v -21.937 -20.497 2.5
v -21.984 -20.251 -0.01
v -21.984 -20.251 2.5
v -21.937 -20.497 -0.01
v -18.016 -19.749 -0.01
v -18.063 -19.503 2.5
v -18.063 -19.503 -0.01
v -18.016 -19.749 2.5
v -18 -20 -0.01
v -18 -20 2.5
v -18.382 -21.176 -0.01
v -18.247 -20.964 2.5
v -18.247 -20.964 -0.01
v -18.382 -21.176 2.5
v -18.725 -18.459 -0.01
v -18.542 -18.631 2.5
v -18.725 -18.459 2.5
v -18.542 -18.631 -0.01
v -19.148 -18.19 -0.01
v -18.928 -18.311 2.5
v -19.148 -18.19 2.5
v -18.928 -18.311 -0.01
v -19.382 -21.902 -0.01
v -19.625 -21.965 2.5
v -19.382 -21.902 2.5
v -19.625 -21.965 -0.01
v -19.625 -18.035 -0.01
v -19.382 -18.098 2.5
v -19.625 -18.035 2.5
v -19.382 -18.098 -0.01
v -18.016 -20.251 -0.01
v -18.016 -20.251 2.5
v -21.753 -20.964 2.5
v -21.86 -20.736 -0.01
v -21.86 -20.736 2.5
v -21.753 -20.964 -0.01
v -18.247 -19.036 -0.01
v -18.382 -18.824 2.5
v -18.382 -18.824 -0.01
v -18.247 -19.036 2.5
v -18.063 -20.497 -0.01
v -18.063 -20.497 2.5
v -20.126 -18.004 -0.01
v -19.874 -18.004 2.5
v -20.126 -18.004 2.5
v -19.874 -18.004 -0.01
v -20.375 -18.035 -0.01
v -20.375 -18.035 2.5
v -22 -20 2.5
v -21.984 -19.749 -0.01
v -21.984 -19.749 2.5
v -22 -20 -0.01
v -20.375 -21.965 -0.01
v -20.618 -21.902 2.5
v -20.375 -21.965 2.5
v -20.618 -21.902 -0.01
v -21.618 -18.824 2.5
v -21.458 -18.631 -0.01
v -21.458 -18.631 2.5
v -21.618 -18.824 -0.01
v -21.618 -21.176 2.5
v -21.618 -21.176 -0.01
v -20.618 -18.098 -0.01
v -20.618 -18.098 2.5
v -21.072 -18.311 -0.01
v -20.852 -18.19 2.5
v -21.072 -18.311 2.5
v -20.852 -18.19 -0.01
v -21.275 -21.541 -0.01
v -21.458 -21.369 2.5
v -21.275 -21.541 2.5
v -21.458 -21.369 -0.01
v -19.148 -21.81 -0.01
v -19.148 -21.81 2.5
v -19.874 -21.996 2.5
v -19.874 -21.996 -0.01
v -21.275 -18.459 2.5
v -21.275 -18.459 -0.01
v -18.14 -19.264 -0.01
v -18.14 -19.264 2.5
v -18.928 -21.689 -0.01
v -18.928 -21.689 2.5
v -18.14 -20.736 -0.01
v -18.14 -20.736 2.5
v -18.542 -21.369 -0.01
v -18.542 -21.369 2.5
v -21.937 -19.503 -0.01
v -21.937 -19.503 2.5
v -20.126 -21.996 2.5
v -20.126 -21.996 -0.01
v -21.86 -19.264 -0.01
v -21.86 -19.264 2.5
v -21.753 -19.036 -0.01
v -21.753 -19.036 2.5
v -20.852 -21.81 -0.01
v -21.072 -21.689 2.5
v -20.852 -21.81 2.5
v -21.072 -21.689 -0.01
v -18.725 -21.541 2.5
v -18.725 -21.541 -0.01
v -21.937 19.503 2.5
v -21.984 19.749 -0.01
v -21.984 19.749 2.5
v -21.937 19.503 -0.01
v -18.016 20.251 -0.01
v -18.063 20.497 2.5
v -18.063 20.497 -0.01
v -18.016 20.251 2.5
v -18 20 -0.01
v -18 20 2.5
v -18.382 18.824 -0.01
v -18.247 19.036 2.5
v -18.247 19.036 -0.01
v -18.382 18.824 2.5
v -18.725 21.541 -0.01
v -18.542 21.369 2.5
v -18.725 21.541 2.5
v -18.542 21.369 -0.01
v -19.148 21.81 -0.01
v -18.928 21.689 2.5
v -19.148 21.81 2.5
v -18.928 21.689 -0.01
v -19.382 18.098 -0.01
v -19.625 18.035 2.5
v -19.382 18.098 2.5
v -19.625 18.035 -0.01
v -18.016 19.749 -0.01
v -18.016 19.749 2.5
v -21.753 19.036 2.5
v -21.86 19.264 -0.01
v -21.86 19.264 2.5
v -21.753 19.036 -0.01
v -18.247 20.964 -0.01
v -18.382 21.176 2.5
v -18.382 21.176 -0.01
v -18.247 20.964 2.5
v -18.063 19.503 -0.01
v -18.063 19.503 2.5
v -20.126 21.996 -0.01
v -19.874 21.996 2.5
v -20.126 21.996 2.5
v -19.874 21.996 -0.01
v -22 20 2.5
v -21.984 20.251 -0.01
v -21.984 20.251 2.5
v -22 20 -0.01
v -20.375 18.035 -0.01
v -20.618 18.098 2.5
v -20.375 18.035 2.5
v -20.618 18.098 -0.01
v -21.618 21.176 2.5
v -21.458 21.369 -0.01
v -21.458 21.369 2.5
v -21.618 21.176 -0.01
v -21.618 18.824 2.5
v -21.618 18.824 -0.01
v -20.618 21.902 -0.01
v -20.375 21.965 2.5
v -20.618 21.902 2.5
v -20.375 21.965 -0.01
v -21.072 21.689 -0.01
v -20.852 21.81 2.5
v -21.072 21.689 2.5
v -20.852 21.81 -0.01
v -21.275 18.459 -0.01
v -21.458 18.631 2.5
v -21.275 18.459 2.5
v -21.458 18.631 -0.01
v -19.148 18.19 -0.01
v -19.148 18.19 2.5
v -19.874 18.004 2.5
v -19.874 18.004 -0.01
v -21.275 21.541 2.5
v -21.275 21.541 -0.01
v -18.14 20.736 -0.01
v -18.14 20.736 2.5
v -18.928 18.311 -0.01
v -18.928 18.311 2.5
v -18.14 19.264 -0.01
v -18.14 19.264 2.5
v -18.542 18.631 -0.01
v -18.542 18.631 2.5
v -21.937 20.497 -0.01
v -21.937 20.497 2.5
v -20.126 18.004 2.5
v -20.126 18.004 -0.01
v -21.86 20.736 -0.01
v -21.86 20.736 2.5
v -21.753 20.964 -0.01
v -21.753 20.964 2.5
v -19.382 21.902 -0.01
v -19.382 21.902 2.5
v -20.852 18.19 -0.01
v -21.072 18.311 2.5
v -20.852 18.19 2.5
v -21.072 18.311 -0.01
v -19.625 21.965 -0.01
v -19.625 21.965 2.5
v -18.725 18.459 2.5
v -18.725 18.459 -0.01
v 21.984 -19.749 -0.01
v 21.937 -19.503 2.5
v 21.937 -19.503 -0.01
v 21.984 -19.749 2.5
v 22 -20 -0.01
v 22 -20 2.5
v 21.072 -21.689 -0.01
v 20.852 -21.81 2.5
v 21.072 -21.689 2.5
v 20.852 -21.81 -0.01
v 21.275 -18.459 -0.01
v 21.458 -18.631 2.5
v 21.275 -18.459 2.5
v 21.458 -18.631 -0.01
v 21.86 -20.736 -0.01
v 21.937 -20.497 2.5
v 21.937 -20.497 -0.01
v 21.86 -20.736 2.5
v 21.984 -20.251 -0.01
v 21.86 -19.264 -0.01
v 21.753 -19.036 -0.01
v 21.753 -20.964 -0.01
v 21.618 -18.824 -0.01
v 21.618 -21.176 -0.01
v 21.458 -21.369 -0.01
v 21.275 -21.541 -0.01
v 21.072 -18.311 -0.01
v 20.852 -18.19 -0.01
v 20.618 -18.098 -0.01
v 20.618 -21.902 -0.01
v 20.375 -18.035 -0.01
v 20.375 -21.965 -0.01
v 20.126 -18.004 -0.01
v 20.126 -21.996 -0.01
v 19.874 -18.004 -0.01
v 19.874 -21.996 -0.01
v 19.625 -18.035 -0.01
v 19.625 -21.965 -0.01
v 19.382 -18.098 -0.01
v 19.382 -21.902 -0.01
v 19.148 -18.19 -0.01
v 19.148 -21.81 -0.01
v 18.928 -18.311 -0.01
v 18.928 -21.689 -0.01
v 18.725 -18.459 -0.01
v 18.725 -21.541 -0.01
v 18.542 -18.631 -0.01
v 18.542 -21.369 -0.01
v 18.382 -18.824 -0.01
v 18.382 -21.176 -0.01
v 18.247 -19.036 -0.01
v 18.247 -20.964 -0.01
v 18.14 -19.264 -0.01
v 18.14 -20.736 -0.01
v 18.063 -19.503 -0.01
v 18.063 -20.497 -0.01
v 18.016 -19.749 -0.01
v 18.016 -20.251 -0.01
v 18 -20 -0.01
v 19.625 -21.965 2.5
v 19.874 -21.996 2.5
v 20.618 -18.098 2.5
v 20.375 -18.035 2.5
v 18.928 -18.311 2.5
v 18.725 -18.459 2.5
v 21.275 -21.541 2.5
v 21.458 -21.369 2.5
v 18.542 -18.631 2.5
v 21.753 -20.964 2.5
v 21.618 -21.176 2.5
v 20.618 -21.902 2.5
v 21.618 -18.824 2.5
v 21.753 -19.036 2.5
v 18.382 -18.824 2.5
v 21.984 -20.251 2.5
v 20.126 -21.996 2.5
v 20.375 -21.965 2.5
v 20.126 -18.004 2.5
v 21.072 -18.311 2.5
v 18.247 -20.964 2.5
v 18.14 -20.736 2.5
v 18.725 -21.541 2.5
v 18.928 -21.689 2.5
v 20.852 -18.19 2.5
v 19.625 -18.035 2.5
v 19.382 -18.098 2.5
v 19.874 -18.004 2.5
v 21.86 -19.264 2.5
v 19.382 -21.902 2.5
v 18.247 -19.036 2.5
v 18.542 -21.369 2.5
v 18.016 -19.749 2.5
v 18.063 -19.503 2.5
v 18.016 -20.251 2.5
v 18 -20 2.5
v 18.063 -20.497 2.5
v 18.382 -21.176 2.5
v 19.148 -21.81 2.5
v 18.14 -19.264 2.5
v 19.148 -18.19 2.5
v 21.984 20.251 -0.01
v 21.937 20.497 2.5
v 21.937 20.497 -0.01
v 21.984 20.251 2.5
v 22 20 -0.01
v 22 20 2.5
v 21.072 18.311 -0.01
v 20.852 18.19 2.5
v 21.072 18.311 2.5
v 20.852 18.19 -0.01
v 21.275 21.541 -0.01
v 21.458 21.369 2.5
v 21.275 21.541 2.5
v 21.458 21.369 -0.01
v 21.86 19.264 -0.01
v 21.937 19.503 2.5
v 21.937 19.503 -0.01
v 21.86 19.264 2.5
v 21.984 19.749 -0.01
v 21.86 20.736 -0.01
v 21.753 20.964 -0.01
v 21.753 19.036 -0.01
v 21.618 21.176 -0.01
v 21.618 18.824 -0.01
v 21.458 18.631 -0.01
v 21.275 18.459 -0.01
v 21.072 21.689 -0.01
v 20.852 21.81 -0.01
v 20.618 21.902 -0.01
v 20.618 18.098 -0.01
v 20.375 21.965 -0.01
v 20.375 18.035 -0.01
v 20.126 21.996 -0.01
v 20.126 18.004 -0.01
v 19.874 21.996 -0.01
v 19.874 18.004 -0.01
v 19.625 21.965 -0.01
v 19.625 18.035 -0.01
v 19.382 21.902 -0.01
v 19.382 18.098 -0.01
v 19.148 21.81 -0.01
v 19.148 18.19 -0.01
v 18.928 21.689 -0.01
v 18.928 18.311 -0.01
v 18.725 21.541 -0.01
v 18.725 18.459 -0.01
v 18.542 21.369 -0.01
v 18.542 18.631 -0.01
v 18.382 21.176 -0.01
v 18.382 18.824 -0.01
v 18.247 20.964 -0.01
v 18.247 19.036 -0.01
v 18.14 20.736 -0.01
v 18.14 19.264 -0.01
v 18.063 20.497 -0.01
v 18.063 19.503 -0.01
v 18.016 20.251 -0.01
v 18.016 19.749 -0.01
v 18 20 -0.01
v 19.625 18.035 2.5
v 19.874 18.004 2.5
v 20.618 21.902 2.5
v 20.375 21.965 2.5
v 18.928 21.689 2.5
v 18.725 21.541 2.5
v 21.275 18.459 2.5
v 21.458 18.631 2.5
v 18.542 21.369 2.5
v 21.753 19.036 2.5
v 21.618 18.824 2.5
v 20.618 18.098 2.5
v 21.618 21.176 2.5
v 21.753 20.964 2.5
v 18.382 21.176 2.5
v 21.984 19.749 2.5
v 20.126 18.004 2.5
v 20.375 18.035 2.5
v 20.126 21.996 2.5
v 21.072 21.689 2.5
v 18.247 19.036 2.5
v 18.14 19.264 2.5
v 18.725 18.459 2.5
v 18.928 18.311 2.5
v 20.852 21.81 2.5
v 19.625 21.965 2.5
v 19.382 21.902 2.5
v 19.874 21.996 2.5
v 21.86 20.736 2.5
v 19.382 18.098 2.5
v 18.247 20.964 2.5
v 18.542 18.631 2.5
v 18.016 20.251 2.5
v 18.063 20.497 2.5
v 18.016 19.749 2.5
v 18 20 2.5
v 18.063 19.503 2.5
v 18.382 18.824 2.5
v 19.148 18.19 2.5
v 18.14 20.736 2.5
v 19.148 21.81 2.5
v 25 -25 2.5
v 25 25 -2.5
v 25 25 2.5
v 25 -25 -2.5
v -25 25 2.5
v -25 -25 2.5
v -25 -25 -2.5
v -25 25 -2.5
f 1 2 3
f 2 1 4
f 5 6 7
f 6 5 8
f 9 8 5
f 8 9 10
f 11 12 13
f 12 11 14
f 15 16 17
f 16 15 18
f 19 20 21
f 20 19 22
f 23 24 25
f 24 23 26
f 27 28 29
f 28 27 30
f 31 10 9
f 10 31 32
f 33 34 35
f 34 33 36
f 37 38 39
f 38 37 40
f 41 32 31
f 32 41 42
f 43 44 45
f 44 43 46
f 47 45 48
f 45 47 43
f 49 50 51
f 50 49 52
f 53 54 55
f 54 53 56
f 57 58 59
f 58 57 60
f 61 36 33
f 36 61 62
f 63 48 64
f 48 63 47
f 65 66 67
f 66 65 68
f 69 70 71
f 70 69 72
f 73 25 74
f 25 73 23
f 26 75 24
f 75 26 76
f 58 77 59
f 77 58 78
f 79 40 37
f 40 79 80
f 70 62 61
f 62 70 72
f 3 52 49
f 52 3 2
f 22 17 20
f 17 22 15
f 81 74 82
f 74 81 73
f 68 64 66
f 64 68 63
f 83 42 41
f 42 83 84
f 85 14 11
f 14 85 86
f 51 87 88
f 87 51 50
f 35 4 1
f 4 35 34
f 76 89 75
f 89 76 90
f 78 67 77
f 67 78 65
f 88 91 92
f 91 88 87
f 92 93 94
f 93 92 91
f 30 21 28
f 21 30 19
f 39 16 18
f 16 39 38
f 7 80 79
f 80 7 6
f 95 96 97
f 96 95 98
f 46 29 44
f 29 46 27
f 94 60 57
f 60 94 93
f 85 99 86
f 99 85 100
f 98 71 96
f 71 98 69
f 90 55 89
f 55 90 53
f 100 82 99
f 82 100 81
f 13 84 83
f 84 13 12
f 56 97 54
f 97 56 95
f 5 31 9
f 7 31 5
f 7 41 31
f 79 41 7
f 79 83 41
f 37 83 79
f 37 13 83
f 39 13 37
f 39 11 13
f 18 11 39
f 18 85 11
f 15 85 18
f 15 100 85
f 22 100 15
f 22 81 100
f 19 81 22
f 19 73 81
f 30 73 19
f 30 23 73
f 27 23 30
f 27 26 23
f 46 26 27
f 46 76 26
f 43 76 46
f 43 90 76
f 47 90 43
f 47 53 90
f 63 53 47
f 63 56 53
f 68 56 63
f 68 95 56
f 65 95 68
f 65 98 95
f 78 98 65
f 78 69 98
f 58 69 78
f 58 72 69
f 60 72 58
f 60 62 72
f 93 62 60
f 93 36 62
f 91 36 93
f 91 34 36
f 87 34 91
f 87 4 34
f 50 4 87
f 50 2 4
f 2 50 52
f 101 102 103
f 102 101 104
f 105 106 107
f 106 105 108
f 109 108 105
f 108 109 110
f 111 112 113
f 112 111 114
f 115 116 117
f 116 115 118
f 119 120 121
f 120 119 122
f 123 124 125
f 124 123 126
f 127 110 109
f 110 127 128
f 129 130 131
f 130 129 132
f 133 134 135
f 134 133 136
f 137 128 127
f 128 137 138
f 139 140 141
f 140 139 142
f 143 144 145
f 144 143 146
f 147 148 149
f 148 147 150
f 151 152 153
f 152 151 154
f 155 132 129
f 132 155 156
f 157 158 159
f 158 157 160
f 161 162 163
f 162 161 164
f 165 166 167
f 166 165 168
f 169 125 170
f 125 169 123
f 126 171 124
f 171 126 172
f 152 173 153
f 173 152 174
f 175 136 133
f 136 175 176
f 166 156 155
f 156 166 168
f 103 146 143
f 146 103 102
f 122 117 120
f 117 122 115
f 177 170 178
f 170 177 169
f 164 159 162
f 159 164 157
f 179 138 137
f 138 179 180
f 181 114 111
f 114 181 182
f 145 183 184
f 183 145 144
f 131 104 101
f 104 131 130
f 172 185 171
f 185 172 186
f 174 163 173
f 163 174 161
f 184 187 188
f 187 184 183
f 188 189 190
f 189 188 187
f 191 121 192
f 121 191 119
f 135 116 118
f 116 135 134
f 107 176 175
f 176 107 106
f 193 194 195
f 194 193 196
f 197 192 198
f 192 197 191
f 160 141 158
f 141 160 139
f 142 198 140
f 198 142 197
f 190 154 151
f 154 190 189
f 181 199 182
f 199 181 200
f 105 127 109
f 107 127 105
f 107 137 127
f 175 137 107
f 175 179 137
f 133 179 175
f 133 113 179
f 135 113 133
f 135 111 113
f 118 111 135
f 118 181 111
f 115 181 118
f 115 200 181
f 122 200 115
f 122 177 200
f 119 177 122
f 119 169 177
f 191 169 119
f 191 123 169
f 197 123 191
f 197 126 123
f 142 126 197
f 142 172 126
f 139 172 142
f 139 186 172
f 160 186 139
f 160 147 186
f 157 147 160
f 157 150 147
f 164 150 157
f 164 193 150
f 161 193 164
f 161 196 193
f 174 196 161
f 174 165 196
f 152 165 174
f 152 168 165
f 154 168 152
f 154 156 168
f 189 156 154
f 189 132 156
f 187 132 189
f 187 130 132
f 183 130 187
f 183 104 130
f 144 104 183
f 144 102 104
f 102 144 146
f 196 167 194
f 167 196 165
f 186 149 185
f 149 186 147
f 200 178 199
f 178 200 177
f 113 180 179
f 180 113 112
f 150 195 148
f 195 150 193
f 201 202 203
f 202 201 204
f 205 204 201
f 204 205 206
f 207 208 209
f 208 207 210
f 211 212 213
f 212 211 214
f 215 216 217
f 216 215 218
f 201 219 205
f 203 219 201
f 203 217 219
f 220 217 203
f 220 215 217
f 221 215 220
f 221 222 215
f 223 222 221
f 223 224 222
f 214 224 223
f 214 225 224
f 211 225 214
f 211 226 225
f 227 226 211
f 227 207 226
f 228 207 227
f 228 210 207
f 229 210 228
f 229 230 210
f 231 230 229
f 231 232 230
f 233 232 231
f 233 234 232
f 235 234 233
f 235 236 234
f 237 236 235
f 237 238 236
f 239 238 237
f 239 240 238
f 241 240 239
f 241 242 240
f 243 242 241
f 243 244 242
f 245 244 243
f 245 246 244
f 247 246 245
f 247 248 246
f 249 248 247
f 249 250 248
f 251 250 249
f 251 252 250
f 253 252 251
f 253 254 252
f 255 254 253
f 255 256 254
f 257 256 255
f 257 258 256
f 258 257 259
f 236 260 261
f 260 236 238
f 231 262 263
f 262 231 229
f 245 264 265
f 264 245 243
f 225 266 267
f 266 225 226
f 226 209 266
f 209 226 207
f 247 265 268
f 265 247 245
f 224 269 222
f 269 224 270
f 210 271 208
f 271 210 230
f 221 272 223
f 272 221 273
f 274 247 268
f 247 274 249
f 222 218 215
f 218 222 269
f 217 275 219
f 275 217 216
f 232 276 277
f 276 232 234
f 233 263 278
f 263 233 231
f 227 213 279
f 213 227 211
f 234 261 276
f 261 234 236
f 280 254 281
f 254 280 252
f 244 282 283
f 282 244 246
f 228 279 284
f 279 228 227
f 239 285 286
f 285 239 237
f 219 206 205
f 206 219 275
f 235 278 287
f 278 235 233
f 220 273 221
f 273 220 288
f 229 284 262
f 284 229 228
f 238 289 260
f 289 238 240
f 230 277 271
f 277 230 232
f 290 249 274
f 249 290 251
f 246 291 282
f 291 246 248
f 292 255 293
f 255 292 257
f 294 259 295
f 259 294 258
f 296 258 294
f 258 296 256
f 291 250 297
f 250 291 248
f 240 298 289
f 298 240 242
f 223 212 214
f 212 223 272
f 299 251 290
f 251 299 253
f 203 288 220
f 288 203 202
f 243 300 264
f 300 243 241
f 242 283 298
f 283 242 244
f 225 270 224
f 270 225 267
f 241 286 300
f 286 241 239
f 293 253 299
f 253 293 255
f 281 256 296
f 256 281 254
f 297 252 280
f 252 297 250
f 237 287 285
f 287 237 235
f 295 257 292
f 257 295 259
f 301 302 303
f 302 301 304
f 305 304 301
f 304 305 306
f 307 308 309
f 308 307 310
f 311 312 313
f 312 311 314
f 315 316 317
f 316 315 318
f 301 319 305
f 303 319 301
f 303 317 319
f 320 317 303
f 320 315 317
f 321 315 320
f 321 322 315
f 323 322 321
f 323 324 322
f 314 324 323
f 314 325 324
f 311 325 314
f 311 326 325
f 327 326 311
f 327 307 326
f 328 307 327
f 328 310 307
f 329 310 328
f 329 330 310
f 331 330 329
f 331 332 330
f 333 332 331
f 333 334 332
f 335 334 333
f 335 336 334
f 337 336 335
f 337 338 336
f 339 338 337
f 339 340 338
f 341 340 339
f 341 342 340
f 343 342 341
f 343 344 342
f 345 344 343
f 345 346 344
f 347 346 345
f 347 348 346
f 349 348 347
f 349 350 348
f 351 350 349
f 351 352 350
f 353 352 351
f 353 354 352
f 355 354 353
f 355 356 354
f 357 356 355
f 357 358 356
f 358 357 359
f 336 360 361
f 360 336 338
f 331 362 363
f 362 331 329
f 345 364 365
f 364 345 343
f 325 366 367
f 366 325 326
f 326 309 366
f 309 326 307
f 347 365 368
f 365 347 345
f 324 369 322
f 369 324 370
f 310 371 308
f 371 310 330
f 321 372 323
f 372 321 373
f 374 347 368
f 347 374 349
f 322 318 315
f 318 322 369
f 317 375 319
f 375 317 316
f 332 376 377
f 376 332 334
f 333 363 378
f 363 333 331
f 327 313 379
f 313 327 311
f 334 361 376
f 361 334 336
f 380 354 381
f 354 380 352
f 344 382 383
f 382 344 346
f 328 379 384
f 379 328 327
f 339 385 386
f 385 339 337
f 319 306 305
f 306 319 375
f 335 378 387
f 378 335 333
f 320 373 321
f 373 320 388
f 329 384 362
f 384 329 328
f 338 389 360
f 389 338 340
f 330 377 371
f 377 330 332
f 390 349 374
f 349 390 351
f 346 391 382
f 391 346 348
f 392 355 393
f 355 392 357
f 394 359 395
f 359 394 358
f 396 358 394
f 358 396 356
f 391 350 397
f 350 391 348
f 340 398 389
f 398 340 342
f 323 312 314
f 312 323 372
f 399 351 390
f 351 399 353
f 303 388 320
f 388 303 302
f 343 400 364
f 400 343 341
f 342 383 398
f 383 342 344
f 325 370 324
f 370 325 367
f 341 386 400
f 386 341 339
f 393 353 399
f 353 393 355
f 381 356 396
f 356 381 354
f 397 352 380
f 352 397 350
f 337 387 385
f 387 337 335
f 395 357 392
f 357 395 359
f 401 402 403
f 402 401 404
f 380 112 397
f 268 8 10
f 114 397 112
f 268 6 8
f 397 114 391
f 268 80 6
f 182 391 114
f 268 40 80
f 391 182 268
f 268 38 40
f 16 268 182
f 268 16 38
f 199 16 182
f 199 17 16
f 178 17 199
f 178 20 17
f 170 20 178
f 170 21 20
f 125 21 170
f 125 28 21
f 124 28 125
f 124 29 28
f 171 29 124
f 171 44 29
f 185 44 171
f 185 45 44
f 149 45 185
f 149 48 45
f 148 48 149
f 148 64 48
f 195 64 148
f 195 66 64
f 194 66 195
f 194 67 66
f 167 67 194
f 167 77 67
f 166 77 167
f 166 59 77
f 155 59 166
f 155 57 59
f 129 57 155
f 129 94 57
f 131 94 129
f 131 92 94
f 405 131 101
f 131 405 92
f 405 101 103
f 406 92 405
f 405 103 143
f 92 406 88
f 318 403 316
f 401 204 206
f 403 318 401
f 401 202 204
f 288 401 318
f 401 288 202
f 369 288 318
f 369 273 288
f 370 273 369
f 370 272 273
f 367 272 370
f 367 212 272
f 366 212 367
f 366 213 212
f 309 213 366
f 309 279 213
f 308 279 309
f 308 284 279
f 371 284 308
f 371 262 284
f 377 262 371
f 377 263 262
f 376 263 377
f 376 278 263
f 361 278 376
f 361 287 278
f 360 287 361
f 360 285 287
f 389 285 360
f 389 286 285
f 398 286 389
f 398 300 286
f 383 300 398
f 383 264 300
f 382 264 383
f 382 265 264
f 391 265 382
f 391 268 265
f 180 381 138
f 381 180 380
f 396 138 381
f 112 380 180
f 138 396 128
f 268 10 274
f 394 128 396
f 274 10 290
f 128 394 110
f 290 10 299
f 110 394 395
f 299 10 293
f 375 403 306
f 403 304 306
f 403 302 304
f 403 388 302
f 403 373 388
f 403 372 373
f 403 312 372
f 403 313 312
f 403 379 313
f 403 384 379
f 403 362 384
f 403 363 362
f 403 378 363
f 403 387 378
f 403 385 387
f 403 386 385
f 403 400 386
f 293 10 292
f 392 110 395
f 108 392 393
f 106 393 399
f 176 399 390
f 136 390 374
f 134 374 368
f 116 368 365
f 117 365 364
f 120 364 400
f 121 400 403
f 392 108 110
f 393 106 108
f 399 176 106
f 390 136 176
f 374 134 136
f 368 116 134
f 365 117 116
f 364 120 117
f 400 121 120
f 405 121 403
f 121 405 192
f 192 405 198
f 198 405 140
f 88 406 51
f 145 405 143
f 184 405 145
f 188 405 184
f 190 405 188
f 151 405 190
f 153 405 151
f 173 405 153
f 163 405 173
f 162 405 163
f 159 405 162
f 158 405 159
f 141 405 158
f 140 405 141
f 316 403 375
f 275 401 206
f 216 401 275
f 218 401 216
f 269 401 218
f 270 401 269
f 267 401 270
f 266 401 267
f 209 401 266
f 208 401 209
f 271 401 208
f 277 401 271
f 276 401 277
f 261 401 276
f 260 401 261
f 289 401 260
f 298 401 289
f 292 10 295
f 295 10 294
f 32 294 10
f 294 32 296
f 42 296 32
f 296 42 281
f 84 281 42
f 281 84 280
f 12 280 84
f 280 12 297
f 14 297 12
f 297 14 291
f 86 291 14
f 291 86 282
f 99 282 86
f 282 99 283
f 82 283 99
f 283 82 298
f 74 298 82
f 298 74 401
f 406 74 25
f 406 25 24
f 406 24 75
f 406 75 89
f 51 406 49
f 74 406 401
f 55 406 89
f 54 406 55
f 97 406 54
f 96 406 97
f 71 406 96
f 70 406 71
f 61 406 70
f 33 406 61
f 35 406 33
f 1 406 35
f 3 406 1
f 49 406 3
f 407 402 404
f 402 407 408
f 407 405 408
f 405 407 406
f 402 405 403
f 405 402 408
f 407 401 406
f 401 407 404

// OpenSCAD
// Mounting Plate with 4 Corner Holes
// Common pattern for mounting brackets

eps = 0.01;
$fn = 50;

module mounting_plate(width, height, thickness, hole_diameter, hole_inset) {
    difference() {
        // Main plate
        cube([width, height, thickness], center=true);
        
        // 4 corner holes
        for(x = [-(width/2-hole_inset), (width/2-hole_inset)]) {
            for(y = [-(height/2-hole_inset), (height/2-hole_inset)]) {
                translate([x, y, -eps])
                    cylinder(h=thickness+2*eps, d=hole_diameter);
            }
        }
    }
}

// Example usage
mounting_plate(50, 50, 5, 4, 5);
